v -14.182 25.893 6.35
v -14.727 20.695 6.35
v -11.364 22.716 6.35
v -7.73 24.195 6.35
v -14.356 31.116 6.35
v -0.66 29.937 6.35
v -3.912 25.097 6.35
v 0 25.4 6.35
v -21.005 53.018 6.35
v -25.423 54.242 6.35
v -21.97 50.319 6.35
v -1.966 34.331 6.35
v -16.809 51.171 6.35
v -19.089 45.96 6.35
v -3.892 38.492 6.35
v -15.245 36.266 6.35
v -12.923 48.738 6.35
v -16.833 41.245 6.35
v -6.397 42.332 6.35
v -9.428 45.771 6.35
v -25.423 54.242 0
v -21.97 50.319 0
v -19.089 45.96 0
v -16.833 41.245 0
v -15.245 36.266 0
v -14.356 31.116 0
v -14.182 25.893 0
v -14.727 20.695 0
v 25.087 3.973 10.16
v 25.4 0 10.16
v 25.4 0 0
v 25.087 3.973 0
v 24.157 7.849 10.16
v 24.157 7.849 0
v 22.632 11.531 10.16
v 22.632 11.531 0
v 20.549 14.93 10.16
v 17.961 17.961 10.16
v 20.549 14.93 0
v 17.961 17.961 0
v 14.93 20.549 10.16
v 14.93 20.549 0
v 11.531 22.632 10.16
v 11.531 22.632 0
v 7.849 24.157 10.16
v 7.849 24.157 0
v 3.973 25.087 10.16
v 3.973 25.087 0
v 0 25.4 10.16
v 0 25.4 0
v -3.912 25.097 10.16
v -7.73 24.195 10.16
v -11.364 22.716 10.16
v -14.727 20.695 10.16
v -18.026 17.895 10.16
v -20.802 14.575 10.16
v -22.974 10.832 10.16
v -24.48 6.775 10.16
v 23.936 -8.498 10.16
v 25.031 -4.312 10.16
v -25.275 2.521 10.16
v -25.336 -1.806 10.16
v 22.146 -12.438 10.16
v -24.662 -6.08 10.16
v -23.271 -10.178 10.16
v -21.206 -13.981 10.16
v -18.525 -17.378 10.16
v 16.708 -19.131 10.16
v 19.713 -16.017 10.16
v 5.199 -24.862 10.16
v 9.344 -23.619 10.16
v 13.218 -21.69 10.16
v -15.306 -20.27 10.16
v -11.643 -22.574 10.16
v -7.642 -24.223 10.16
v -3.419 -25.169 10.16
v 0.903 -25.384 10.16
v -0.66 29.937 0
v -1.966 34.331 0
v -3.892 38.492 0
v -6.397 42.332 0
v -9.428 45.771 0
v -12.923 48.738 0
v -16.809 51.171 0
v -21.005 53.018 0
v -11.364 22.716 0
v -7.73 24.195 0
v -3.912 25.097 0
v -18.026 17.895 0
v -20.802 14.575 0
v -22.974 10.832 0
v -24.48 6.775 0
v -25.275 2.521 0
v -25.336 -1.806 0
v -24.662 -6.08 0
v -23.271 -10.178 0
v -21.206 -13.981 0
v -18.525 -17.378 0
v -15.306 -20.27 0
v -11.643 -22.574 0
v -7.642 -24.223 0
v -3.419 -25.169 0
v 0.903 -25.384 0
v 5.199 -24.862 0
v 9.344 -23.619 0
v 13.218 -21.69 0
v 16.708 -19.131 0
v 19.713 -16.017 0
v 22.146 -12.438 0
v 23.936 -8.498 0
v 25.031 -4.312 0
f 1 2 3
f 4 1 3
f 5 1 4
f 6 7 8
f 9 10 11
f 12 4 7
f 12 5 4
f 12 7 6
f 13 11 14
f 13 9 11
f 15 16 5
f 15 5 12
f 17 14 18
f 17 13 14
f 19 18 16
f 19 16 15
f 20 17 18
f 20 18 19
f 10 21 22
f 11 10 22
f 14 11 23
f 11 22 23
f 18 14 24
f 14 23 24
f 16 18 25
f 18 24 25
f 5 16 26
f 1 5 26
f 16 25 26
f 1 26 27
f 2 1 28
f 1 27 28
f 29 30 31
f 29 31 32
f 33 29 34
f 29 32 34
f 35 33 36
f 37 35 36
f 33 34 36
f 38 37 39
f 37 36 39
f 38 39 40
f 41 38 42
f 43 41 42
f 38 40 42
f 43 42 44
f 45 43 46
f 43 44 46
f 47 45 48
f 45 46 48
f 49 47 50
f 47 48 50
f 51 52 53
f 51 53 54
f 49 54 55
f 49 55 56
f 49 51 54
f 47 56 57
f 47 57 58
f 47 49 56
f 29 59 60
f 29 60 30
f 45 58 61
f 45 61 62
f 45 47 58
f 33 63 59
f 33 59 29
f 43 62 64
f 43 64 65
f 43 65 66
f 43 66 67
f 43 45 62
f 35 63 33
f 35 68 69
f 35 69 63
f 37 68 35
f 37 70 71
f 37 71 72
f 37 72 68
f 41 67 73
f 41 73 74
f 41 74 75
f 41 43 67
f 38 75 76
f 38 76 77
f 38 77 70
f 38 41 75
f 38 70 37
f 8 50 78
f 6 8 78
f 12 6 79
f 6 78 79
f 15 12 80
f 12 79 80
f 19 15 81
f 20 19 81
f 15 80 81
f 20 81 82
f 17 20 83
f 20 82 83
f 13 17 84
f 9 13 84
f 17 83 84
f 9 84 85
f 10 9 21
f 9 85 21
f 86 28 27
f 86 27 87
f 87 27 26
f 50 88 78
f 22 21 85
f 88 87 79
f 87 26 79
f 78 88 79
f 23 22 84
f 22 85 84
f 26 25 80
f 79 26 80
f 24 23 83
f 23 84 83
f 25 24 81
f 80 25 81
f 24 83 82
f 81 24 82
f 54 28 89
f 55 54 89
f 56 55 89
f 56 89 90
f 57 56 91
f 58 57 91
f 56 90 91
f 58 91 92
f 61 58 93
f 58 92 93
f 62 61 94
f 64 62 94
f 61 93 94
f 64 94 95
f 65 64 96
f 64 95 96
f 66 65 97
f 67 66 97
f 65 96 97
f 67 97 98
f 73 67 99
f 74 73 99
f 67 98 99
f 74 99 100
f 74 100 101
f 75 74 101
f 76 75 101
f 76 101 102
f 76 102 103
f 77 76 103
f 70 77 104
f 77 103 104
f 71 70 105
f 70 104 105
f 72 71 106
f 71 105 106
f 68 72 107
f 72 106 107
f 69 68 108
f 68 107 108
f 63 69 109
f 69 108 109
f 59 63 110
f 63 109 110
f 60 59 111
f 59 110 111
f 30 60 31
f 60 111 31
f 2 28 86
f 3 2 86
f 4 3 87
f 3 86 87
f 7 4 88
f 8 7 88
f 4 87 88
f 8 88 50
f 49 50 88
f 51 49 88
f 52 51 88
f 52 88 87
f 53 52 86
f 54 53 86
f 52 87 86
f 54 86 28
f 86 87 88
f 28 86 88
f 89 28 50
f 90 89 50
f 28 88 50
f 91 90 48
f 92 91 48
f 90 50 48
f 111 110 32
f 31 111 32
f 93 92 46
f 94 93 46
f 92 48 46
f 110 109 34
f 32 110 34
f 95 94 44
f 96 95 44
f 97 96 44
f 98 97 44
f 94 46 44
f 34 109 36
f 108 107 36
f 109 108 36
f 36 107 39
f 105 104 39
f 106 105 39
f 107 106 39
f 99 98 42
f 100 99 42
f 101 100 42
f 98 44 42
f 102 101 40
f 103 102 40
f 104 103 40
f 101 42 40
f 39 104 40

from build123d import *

# Parameters (mm, degrees)
F1_DEPTH = 10.16
F2_DEPTH = 6.35


with BuildPart() as f1:
    # F0 (on Top) → F1 (new body)
    with BuildSketch(Plane.XY):
        with BuildLine():
            ThreePointArc((-14.726522, 20.695158), (-11.64273, -22.574473), (25.4, 0))
            ThreePointArc((25.4, 0), (17.960512, 17.960512), (0, 25.4))
            ThreePointArc((0, 25.4), (-7.729909, 24.195217), (-14.726522, 20.695158))
        make_face()
    extrude(amount=F1_DEPTH)


with BuildPart() as f2:
    # F0 (on Top) → F2 (new body)
    with BuildSketch(Plane.XY):
        with BuildLine():
            ThreePointArc((-14.726522, 20.695158), (-7.729909, 24.195217), (0, 25.4))
            ThreePointArc((0, 25.4), (-7.850271, 44.106387), (-25.423421, 54.242466))
            ThreePointArc((-25.423421, 54.242466), (-15.953038, 38.783132), (-14.726522, 20.695158))
        make_face()
    extrude(amount=F2_DEPTH)


solid = Compound([f1.part, f2.part])
